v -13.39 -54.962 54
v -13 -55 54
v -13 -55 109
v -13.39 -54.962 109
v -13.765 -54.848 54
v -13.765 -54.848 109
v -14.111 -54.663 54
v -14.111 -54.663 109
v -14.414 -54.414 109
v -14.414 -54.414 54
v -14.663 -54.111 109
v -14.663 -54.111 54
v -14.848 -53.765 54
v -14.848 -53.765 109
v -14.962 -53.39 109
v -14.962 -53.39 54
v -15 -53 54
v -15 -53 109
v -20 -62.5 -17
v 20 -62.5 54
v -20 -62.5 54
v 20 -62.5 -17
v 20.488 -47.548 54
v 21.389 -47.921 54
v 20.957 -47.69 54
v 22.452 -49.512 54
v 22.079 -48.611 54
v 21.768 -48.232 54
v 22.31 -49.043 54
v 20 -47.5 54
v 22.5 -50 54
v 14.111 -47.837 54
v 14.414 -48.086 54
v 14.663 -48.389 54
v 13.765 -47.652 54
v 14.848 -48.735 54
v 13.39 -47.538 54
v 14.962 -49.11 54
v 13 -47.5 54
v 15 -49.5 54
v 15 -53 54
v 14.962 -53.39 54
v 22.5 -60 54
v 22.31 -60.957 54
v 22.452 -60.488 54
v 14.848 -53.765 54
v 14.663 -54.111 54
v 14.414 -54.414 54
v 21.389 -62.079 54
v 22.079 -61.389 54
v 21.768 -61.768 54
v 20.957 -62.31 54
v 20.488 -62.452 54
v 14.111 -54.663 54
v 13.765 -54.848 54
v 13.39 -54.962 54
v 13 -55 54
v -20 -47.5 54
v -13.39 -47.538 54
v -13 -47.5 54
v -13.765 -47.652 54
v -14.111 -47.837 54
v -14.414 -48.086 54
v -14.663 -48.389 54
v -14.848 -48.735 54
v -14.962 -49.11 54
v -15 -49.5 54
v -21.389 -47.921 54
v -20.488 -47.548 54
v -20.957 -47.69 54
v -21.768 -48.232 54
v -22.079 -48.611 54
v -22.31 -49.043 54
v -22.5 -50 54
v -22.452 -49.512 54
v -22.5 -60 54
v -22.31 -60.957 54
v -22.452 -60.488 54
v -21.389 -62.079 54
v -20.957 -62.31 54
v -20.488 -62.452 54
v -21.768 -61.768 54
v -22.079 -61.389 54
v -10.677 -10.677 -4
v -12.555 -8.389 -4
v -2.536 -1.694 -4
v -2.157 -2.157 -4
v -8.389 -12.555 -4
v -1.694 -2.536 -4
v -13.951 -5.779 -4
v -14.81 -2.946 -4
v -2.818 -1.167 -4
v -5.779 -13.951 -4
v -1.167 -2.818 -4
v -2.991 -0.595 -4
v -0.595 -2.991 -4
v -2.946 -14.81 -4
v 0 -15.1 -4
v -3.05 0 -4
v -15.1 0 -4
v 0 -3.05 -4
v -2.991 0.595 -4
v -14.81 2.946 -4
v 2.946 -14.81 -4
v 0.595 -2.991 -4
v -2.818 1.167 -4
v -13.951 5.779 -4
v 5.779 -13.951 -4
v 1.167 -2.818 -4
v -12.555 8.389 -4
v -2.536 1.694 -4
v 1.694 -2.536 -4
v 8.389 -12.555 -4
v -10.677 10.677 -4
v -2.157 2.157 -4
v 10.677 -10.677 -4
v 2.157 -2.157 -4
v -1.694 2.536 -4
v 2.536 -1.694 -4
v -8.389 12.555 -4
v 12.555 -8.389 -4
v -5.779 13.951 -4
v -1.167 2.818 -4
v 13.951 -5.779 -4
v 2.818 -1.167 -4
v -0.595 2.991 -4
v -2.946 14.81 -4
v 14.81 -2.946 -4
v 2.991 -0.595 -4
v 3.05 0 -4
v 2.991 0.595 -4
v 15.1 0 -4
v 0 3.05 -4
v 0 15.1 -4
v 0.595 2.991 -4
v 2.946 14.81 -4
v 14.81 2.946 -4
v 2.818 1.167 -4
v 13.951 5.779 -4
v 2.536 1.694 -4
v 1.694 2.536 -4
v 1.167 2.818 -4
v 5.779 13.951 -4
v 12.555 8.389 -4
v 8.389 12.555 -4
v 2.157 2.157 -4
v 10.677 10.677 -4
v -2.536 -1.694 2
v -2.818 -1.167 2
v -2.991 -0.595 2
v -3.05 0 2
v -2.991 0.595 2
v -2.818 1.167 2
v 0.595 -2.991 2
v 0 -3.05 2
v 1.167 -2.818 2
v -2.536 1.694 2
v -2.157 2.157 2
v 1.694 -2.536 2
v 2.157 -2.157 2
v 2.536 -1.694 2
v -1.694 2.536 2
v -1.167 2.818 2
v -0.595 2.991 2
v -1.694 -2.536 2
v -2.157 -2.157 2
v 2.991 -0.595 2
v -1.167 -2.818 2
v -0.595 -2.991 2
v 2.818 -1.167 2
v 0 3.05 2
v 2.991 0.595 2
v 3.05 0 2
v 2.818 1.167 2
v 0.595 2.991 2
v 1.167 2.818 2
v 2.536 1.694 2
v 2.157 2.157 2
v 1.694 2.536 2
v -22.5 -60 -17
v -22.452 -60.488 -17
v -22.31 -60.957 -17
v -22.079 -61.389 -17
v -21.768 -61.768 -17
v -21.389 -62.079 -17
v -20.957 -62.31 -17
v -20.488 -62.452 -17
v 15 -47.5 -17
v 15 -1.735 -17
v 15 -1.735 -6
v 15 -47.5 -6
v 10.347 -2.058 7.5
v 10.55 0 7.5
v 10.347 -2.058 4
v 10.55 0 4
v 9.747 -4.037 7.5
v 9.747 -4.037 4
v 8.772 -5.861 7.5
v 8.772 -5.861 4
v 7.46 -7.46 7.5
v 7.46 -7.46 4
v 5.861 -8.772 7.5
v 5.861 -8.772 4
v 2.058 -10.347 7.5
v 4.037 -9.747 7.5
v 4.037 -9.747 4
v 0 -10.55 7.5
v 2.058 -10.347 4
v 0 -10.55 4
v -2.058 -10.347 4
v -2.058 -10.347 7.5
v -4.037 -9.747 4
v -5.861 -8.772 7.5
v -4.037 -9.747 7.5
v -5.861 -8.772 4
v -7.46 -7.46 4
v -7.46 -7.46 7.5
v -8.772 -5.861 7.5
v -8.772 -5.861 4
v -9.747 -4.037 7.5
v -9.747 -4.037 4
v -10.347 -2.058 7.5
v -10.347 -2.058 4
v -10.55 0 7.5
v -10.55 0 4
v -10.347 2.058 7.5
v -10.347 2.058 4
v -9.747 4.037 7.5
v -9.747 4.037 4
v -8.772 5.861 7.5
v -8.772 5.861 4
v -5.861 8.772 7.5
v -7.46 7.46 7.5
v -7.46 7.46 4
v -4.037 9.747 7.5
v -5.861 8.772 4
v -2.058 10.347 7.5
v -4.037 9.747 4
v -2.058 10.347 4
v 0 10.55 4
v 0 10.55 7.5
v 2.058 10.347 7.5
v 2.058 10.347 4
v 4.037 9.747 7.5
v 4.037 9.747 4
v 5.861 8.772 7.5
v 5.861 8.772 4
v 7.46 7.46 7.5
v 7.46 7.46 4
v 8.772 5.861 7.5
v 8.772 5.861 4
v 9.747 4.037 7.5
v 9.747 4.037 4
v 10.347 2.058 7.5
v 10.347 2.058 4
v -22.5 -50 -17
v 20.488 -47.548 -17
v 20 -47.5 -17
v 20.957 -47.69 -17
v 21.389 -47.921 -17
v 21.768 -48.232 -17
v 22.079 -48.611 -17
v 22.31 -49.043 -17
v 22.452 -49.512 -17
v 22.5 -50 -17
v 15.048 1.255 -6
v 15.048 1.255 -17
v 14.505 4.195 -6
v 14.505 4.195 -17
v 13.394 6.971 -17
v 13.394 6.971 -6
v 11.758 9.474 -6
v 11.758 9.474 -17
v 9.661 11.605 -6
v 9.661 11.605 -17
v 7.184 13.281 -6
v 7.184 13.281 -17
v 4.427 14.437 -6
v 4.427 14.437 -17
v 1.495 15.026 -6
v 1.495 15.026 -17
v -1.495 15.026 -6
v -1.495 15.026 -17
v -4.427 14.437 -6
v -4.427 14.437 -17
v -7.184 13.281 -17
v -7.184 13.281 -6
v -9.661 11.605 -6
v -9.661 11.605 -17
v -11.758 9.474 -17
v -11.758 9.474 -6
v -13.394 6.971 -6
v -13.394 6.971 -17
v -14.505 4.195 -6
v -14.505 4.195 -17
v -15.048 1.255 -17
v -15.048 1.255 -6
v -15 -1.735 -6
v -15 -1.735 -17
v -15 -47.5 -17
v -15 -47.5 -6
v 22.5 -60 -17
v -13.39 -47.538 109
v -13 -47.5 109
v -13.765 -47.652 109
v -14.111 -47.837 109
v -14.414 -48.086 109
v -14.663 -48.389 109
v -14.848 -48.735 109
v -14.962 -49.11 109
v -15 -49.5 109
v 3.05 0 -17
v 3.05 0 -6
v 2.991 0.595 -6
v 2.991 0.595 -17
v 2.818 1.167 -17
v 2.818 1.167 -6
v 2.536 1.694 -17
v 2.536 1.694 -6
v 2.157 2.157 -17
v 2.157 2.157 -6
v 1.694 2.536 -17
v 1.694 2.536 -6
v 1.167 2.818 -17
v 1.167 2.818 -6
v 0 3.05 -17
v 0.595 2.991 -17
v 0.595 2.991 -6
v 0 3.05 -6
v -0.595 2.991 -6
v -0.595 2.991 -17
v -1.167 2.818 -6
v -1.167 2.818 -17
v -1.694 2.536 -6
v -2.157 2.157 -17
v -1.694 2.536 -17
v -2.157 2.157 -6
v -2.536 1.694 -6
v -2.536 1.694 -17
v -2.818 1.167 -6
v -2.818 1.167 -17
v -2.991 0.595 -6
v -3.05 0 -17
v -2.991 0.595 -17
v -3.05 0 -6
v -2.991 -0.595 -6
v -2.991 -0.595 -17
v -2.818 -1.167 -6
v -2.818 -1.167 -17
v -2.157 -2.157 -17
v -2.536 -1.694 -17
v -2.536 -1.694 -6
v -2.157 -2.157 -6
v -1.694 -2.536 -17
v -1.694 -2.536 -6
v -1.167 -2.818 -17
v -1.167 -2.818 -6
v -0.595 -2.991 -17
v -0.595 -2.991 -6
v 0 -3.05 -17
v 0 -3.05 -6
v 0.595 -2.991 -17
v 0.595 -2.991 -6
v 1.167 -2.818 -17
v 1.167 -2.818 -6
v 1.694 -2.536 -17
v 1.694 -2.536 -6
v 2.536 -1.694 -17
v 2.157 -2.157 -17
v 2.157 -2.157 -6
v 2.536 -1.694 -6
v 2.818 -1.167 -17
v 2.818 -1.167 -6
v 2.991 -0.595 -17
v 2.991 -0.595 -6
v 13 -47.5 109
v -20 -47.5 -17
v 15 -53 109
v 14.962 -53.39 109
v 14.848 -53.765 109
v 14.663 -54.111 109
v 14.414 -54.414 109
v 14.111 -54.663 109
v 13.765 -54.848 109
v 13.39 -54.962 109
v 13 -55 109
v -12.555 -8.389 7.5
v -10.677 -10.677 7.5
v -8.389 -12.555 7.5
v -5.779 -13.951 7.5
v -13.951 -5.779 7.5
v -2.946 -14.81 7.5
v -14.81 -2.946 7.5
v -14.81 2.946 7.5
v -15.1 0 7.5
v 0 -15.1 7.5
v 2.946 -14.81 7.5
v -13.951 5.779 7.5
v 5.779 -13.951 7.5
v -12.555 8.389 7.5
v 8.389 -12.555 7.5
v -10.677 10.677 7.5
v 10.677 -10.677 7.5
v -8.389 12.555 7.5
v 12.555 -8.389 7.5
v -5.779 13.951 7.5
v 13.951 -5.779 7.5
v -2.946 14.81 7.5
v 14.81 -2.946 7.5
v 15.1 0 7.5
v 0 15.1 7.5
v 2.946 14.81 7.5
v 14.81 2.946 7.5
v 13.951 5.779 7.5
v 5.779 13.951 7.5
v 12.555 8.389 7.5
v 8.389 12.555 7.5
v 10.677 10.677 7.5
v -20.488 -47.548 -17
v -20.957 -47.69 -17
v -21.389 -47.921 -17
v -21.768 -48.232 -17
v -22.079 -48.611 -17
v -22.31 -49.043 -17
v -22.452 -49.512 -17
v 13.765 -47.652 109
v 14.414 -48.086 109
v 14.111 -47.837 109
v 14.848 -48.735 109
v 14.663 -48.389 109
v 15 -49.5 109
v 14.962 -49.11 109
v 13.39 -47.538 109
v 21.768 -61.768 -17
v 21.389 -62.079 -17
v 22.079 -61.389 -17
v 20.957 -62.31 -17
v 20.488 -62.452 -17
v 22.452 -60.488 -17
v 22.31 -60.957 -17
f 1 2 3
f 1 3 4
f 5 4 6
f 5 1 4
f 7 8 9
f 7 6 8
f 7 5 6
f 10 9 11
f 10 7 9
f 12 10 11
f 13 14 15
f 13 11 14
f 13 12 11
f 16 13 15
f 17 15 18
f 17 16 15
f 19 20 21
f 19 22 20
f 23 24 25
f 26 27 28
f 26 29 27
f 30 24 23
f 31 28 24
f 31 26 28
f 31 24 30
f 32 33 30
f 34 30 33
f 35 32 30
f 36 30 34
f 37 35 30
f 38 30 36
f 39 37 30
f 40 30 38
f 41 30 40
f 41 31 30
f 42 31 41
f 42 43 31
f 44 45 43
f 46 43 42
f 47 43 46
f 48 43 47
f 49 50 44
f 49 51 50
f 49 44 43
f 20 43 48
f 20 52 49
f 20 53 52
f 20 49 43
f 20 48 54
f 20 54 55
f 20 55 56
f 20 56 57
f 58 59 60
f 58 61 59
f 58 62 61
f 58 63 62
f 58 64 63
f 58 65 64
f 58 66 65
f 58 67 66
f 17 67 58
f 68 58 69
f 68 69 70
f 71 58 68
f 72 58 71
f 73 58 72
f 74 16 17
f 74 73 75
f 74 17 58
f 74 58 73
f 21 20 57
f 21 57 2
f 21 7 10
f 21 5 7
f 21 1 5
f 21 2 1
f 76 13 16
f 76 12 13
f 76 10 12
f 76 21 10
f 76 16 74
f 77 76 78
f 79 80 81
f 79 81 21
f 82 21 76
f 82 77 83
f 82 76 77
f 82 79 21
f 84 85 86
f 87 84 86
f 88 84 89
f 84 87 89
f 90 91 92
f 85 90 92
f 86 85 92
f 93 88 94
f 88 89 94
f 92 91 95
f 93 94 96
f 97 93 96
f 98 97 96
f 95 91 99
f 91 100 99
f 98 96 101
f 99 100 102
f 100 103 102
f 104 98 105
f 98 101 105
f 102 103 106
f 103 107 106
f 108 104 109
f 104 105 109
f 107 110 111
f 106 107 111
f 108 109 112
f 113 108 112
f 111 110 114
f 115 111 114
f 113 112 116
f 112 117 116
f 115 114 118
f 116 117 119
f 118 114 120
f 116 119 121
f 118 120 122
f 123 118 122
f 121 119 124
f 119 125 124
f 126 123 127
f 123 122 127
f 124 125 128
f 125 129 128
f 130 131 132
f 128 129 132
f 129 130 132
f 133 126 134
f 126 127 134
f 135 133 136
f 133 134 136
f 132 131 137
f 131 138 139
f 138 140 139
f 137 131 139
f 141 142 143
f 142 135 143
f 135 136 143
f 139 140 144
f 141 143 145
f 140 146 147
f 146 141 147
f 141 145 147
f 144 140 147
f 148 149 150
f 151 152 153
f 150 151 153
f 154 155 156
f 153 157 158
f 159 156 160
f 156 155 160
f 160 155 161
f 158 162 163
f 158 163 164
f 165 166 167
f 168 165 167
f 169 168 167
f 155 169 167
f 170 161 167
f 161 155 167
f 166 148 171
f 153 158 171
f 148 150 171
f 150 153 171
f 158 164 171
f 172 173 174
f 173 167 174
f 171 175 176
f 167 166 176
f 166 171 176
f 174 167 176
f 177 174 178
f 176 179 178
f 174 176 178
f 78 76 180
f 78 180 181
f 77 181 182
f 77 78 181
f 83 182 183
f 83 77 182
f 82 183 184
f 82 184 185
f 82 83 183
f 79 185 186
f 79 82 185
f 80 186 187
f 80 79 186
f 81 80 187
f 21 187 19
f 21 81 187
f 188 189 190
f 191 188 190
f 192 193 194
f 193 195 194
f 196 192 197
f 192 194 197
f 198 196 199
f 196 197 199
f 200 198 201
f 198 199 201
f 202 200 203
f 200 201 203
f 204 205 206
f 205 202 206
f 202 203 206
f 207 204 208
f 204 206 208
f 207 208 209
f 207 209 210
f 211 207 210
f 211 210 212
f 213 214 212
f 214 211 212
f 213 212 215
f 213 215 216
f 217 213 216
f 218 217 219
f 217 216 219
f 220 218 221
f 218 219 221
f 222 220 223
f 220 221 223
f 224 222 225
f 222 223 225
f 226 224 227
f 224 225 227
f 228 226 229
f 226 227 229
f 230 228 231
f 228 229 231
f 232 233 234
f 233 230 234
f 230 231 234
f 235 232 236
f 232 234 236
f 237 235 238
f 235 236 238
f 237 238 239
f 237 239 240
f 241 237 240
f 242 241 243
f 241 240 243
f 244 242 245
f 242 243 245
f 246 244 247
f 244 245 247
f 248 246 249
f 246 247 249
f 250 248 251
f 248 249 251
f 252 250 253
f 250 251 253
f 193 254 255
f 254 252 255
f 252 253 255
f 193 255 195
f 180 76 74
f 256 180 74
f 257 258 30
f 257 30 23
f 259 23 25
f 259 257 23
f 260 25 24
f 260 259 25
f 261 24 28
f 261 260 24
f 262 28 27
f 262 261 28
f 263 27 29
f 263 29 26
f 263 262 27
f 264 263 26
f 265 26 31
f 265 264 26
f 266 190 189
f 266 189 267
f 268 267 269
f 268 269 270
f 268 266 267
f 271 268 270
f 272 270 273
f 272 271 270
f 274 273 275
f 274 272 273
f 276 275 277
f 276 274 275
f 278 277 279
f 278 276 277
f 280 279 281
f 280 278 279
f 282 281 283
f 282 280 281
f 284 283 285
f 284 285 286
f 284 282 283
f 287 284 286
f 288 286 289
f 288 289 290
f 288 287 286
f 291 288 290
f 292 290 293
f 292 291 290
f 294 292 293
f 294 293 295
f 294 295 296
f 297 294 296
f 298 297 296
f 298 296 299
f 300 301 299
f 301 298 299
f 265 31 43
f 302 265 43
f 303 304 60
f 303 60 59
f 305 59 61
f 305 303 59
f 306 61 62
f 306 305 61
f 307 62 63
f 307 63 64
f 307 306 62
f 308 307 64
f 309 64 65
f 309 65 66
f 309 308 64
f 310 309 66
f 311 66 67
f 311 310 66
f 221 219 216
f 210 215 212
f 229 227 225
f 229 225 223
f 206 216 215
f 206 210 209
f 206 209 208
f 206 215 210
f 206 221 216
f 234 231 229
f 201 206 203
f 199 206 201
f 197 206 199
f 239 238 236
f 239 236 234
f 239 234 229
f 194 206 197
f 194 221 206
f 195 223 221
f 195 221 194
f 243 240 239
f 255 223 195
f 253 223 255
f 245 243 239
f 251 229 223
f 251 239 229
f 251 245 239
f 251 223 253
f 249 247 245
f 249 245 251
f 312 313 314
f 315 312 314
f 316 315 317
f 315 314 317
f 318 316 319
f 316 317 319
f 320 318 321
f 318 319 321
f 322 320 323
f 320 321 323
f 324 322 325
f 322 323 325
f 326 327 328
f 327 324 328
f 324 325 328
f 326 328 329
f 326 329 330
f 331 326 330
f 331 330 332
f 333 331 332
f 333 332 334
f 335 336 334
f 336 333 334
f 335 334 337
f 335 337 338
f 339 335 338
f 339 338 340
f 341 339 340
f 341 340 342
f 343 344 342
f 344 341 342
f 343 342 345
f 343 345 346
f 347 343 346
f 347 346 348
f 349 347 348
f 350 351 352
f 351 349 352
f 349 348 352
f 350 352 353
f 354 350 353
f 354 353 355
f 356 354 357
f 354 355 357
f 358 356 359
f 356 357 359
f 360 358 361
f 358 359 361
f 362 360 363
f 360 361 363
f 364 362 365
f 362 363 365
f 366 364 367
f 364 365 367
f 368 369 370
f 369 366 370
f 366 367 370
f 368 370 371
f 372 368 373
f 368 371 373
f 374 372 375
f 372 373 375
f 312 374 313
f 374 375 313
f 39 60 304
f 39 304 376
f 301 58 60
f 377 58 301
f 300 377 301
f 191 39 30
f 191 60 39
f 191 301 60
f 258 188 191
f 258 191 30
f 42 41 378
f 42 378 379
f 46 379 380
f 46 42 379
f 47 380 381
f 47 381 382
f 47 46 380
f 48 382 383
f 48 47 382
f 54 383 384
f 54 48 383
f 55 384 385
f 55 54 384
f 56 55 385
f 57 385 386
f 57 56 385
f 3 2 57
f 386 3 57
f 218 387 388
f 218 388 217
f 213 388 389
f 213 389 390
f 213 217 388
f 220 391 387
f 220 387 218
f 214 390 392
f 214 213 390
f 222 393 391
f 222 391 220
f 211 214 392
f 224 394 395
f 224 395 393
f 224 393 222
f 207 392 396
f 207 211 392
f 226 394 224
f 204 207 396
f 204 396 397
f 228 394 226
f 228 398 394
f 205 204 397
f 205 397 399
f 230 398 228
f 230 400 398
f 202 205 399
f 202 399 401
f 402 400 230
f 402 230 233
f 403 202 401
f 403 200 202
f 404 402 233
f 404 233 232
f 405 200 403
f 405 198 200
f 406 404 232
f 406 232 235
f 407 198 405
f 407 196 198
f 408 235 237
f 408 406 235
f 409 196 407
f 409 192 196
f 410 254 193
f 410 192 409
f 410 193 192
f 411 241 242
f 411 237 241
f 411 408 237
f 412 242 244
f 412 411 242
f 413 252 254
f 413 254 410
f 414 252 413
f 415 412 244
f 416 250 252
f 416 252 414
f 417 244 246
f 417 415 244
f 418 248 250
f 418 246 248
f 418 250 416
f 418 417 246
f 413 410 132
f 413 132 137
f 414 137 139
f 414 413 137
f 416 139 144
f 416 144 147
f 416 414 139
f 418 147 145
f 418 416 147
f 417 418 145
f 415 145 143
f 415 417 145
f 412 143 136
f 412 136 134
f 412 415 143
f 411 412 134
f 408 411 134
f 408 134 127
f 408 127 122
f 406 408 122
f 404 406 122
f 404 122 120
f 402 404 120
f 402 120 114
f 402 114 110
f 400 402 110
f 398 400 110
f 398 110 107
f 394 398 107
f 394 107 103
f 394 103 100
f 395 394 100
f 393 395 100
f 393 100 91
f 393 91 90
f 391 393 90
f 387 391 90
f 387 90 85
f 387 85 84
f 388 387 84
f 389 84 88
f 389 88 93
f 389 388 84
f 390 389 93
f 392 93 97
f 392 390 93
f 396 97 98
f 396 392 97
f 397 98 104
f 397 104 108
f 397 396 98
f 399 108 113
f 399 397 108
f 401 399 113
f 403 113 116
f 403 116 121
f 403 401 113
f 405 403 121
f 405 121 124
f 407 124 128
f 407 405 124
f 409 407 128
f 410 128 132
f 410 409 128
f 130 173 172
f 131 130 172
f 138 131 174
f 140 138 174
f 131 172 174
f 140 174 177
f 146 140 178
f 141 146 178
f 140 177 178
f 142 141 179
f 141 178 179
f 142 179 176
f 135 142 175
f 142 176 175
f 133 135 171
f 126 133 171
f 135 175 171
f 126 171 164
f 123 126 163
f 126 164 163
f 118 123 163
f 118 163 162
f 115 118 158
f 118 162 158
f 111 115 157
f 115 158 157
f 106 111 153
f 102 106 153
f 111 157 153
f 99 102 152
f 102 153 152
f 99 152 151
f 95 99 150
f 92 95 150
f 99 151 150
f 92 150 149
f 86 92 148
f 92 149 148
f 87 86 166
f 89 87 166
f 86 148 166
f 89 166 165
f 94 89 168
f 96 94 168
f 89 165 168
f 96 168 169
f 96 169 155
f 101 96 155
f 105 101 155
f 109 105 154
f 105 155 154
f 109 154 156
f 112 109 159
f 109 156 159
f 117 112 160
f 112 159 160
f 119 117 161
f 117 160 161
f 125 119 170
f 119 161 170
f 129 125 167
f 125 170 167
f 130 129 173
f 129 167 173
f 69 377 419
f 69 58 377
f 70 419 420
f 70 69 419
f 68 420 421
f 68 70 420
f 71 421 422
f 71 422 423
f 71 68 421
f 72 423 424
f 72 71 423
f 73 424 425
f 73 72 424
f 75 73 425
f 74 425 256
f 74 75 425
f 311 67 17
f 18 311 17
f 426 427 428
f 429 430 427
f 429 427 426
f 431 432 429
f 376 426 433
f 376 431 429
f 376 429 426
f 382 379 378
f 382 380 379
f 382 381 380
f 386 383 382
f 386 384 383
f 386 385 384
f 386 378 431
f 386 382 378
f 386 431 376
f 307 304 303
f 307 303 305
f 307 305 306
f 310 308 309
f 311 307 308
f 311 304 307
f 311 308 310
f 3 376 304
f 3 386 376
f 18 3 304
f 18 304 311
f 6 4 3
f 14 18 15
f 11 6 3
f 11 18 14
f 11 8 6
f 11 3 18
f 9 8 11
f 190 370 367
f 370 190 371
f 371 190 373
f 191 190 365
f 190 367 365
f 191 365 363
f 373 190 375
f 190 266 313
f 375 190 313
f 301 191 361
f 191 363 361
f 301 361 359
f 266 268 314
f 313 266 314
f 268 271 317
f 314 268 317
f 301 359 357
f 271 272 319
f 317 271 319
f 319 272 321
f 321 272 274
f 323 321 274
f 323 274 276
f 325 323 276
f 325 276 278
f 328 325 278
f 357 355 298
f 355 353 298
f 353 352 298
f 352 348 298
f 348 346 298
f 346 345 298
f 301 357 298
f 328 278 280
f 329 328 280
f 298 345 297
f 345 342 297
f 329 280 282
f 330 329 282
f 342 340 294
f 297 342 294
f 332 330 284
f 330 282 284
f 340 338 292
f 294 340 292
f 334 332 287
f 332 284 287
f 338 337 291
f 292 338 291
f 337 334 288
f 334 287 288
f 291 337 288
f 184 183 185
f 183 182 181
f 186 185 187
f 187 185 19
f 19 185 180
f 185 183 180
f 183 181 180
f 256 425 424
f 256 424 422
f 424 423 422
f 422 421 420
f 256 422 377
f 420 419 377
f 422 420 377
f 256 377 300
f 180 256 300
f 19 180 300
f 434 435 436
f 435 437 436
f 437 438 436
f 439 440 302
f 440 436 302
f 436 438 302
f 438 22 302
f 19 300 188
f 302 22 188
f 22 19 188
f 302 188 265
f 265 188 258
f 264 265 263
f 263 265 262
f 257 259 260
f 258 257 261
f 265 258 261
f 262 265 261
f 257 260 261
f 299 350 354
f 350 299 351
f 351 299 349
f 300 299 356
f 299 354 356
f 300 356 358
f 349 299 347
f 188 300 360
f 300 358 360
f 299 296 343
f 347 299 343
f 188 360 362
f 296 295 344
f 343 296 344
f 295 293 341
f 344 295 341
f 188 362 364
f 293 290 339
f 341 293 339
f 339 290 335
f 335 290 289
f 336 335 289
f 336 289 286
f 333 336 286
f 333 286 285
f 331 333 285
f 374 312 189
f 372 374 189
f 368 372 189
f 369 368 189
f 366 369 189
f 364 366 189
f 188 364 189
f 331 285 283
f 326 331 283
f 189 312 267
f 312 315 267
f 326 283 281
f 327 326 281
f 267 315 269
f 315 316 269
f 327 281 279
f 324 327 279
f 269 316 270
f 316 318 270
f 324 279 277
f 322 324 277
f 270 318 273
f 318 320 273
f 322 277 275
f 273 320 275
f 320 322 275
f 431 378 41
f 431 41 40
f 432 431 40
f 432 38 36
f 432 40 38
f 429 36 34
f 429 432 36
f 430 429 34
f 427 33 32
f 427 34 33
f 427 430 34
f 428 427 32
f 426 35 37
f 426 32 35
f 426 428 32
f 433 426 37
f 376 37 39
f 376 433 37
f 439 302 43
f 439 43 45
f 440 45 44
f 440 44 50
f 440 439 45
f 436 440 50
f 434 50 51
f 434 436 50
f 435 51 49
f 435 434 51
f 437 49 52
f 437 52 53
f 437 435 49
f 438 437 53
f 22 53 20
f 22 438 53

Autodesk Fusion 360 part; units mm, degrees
sketch "Sketch1" plane through (0, 0, 0) normal (0, 0, 1) x (1, 0, 0)
  circle A0 centre (0, 0) radius 15.1
  circle A1 centre (0, 0) radius 10.55
  circle A2 centre (0, 0) radius 3.05
  dimension "d1" = 30.2
  dimension "d2" = 21.1
  dimension "d3" = 6.1
extrude "Extrude1" add sketch "Sketch1" along normal blind 7.5 contours A0 makes body 1
extrude "Extrude2" add sketch "Sketch1" along normal blind 3 contours A1 | A2 bodies 1
extrude "Extrude3" cut sketch "Sketch1" along normal blind 4 contours A2 bodies 1
extrude "Extrude4" add 1 faces at (8.0107, -0.5241, 3) along direction (0, 0, 1) blind 1 on bodies 1 bodies 1
extrude "Extrude5" add 1 faces at (11.0158, -0.9017, 0) along direction (0, 0, -1) blind 2 on bodies 1 bodies 1
extrude "Extrude6" add sketch "Sketch1" along normal blind 4 and the other way blind -2 contours A2 bodies 1
extrude "Extrude7" add 1 faces at (11.0158, -0.9017, -2) along direction (0, 0, -1) blind 12 and the other way blind -4 on bodies 1 bodies 1 makes body 2
extrude "Extrude8" add 1 faces at (11.0158, -0.9017, -2) along direction (0, 0, -1) blind 2 on bodies 1 bodies 1
sketch "Sketch2" plane through (0, 0, 0) normal (0, 1, 0) x (1, 0, 0)
extrude "Extrude9" add 1 faces at (11.0158, -0.9017, -14) along direction (0, 0, -1) blind 3 on bodies 2 bodies 2
sketch "Sketch3" plane through (0, 0, 0) normal (0, 1, 0) x (1, 0, 0)
  line L0 (-15, 17) -> (15, 17)
  line L1 (15, 17) -> (15, 6)
  line L2 (15, 6) -> (-15, 6)
  line L3 (-15, 6) -> (-15, 17)
extrude "Extrude10" add sketch "Sketch3" against normal blind 50 bodies 2
extrude "Extrude11" cut sketch "Sketch1" against normal blind 23 contours A2 bodies 2
extrude "Extrude12" add 1 faces at (-5, -50, -13.3333) along direction (0, -1, 0) blind 5 on bodies 2 bodies 2
sketch "Sketch4" plane through (0, 0, -6) normal (0, 0, 1) x (-1, 0, 0)
  circle A0 centre (0, 0) radius 3.05
  arc A1 (-15, 1.7349) -> (15, 1.7349) centre (0, 0) ccw
  line L0 (15, 1.7349) -> (15, 55)
  line L1 (15, 55) -> (-15, 55)
  line L2 (-15, 55) -> (-15, 1.7349)
  line L3 (22.5, 47.5) -> (-22.5, 47.5)
  line L4 (-22.5, 47.5) -> (-22.5, 62.5)
  line L5 (-22.5, 62.5) -> (22.5, 62.5)
  line L6 (22.5, 62.5) -> (22.5, 47.5)
  line L7 (22.5, 47.5) -> (-22.5, 62.5) construction
  line L8 (-22.5, 47.5) -> (22.5, 62.5) construction
  point P0 (0, 55)
  dimension "d36" = 15
extrude "Extrude13" add sketch "Sketch4" along normal blind 55 and the other way blind 11 contours L0 L1 L2 L3 L4 L5 L6 bodies 2
extrude "Extrude14" add 1 faces at (5, -60, 49) along direction (0, 0, 1) blind 10 on bodies 2 bodies 2
extrude "Extrude15" add sketch "Sketch4" along normal blind 150 contours L0 L1 L2 L3 bodies 2
extrude "Extrude16" cut 1 faces at (5, -50, 144) along direction (0, 0, -1) blind 25 on bodies 2 bodies 2
extrude "Extrude17" cut 1 faces at (5, -60, 59) along direction (0, 0, -1) blind 10 on bodies 2 bodies 2
extrude "Extrude18" cut 1 faces at (5, -50, 119) along direction (0, 0, -1) blind 10 on bodies 2 bodies 2
extrude "Extrude19" add 1 faces at (5, -60, 49) along direction (0, 0, 1) blind 5 on bodies 2 bodies 2
fillet "Fillet1" radius 2 4 edges at (-15, -47.5, 81.5) (15, -47.5, 81.5) (15, -55, 81.5) (-15, -55, 81.5) on bodies 2
fillet "Fillet2" radius 2.5 4 edges at (22.5, -62.5, 18.5) (22.5, -47.5, 18.5) (-22.5, -62.5, 18.5) (-22.5, -47.5, 18.5) on bodies 2
